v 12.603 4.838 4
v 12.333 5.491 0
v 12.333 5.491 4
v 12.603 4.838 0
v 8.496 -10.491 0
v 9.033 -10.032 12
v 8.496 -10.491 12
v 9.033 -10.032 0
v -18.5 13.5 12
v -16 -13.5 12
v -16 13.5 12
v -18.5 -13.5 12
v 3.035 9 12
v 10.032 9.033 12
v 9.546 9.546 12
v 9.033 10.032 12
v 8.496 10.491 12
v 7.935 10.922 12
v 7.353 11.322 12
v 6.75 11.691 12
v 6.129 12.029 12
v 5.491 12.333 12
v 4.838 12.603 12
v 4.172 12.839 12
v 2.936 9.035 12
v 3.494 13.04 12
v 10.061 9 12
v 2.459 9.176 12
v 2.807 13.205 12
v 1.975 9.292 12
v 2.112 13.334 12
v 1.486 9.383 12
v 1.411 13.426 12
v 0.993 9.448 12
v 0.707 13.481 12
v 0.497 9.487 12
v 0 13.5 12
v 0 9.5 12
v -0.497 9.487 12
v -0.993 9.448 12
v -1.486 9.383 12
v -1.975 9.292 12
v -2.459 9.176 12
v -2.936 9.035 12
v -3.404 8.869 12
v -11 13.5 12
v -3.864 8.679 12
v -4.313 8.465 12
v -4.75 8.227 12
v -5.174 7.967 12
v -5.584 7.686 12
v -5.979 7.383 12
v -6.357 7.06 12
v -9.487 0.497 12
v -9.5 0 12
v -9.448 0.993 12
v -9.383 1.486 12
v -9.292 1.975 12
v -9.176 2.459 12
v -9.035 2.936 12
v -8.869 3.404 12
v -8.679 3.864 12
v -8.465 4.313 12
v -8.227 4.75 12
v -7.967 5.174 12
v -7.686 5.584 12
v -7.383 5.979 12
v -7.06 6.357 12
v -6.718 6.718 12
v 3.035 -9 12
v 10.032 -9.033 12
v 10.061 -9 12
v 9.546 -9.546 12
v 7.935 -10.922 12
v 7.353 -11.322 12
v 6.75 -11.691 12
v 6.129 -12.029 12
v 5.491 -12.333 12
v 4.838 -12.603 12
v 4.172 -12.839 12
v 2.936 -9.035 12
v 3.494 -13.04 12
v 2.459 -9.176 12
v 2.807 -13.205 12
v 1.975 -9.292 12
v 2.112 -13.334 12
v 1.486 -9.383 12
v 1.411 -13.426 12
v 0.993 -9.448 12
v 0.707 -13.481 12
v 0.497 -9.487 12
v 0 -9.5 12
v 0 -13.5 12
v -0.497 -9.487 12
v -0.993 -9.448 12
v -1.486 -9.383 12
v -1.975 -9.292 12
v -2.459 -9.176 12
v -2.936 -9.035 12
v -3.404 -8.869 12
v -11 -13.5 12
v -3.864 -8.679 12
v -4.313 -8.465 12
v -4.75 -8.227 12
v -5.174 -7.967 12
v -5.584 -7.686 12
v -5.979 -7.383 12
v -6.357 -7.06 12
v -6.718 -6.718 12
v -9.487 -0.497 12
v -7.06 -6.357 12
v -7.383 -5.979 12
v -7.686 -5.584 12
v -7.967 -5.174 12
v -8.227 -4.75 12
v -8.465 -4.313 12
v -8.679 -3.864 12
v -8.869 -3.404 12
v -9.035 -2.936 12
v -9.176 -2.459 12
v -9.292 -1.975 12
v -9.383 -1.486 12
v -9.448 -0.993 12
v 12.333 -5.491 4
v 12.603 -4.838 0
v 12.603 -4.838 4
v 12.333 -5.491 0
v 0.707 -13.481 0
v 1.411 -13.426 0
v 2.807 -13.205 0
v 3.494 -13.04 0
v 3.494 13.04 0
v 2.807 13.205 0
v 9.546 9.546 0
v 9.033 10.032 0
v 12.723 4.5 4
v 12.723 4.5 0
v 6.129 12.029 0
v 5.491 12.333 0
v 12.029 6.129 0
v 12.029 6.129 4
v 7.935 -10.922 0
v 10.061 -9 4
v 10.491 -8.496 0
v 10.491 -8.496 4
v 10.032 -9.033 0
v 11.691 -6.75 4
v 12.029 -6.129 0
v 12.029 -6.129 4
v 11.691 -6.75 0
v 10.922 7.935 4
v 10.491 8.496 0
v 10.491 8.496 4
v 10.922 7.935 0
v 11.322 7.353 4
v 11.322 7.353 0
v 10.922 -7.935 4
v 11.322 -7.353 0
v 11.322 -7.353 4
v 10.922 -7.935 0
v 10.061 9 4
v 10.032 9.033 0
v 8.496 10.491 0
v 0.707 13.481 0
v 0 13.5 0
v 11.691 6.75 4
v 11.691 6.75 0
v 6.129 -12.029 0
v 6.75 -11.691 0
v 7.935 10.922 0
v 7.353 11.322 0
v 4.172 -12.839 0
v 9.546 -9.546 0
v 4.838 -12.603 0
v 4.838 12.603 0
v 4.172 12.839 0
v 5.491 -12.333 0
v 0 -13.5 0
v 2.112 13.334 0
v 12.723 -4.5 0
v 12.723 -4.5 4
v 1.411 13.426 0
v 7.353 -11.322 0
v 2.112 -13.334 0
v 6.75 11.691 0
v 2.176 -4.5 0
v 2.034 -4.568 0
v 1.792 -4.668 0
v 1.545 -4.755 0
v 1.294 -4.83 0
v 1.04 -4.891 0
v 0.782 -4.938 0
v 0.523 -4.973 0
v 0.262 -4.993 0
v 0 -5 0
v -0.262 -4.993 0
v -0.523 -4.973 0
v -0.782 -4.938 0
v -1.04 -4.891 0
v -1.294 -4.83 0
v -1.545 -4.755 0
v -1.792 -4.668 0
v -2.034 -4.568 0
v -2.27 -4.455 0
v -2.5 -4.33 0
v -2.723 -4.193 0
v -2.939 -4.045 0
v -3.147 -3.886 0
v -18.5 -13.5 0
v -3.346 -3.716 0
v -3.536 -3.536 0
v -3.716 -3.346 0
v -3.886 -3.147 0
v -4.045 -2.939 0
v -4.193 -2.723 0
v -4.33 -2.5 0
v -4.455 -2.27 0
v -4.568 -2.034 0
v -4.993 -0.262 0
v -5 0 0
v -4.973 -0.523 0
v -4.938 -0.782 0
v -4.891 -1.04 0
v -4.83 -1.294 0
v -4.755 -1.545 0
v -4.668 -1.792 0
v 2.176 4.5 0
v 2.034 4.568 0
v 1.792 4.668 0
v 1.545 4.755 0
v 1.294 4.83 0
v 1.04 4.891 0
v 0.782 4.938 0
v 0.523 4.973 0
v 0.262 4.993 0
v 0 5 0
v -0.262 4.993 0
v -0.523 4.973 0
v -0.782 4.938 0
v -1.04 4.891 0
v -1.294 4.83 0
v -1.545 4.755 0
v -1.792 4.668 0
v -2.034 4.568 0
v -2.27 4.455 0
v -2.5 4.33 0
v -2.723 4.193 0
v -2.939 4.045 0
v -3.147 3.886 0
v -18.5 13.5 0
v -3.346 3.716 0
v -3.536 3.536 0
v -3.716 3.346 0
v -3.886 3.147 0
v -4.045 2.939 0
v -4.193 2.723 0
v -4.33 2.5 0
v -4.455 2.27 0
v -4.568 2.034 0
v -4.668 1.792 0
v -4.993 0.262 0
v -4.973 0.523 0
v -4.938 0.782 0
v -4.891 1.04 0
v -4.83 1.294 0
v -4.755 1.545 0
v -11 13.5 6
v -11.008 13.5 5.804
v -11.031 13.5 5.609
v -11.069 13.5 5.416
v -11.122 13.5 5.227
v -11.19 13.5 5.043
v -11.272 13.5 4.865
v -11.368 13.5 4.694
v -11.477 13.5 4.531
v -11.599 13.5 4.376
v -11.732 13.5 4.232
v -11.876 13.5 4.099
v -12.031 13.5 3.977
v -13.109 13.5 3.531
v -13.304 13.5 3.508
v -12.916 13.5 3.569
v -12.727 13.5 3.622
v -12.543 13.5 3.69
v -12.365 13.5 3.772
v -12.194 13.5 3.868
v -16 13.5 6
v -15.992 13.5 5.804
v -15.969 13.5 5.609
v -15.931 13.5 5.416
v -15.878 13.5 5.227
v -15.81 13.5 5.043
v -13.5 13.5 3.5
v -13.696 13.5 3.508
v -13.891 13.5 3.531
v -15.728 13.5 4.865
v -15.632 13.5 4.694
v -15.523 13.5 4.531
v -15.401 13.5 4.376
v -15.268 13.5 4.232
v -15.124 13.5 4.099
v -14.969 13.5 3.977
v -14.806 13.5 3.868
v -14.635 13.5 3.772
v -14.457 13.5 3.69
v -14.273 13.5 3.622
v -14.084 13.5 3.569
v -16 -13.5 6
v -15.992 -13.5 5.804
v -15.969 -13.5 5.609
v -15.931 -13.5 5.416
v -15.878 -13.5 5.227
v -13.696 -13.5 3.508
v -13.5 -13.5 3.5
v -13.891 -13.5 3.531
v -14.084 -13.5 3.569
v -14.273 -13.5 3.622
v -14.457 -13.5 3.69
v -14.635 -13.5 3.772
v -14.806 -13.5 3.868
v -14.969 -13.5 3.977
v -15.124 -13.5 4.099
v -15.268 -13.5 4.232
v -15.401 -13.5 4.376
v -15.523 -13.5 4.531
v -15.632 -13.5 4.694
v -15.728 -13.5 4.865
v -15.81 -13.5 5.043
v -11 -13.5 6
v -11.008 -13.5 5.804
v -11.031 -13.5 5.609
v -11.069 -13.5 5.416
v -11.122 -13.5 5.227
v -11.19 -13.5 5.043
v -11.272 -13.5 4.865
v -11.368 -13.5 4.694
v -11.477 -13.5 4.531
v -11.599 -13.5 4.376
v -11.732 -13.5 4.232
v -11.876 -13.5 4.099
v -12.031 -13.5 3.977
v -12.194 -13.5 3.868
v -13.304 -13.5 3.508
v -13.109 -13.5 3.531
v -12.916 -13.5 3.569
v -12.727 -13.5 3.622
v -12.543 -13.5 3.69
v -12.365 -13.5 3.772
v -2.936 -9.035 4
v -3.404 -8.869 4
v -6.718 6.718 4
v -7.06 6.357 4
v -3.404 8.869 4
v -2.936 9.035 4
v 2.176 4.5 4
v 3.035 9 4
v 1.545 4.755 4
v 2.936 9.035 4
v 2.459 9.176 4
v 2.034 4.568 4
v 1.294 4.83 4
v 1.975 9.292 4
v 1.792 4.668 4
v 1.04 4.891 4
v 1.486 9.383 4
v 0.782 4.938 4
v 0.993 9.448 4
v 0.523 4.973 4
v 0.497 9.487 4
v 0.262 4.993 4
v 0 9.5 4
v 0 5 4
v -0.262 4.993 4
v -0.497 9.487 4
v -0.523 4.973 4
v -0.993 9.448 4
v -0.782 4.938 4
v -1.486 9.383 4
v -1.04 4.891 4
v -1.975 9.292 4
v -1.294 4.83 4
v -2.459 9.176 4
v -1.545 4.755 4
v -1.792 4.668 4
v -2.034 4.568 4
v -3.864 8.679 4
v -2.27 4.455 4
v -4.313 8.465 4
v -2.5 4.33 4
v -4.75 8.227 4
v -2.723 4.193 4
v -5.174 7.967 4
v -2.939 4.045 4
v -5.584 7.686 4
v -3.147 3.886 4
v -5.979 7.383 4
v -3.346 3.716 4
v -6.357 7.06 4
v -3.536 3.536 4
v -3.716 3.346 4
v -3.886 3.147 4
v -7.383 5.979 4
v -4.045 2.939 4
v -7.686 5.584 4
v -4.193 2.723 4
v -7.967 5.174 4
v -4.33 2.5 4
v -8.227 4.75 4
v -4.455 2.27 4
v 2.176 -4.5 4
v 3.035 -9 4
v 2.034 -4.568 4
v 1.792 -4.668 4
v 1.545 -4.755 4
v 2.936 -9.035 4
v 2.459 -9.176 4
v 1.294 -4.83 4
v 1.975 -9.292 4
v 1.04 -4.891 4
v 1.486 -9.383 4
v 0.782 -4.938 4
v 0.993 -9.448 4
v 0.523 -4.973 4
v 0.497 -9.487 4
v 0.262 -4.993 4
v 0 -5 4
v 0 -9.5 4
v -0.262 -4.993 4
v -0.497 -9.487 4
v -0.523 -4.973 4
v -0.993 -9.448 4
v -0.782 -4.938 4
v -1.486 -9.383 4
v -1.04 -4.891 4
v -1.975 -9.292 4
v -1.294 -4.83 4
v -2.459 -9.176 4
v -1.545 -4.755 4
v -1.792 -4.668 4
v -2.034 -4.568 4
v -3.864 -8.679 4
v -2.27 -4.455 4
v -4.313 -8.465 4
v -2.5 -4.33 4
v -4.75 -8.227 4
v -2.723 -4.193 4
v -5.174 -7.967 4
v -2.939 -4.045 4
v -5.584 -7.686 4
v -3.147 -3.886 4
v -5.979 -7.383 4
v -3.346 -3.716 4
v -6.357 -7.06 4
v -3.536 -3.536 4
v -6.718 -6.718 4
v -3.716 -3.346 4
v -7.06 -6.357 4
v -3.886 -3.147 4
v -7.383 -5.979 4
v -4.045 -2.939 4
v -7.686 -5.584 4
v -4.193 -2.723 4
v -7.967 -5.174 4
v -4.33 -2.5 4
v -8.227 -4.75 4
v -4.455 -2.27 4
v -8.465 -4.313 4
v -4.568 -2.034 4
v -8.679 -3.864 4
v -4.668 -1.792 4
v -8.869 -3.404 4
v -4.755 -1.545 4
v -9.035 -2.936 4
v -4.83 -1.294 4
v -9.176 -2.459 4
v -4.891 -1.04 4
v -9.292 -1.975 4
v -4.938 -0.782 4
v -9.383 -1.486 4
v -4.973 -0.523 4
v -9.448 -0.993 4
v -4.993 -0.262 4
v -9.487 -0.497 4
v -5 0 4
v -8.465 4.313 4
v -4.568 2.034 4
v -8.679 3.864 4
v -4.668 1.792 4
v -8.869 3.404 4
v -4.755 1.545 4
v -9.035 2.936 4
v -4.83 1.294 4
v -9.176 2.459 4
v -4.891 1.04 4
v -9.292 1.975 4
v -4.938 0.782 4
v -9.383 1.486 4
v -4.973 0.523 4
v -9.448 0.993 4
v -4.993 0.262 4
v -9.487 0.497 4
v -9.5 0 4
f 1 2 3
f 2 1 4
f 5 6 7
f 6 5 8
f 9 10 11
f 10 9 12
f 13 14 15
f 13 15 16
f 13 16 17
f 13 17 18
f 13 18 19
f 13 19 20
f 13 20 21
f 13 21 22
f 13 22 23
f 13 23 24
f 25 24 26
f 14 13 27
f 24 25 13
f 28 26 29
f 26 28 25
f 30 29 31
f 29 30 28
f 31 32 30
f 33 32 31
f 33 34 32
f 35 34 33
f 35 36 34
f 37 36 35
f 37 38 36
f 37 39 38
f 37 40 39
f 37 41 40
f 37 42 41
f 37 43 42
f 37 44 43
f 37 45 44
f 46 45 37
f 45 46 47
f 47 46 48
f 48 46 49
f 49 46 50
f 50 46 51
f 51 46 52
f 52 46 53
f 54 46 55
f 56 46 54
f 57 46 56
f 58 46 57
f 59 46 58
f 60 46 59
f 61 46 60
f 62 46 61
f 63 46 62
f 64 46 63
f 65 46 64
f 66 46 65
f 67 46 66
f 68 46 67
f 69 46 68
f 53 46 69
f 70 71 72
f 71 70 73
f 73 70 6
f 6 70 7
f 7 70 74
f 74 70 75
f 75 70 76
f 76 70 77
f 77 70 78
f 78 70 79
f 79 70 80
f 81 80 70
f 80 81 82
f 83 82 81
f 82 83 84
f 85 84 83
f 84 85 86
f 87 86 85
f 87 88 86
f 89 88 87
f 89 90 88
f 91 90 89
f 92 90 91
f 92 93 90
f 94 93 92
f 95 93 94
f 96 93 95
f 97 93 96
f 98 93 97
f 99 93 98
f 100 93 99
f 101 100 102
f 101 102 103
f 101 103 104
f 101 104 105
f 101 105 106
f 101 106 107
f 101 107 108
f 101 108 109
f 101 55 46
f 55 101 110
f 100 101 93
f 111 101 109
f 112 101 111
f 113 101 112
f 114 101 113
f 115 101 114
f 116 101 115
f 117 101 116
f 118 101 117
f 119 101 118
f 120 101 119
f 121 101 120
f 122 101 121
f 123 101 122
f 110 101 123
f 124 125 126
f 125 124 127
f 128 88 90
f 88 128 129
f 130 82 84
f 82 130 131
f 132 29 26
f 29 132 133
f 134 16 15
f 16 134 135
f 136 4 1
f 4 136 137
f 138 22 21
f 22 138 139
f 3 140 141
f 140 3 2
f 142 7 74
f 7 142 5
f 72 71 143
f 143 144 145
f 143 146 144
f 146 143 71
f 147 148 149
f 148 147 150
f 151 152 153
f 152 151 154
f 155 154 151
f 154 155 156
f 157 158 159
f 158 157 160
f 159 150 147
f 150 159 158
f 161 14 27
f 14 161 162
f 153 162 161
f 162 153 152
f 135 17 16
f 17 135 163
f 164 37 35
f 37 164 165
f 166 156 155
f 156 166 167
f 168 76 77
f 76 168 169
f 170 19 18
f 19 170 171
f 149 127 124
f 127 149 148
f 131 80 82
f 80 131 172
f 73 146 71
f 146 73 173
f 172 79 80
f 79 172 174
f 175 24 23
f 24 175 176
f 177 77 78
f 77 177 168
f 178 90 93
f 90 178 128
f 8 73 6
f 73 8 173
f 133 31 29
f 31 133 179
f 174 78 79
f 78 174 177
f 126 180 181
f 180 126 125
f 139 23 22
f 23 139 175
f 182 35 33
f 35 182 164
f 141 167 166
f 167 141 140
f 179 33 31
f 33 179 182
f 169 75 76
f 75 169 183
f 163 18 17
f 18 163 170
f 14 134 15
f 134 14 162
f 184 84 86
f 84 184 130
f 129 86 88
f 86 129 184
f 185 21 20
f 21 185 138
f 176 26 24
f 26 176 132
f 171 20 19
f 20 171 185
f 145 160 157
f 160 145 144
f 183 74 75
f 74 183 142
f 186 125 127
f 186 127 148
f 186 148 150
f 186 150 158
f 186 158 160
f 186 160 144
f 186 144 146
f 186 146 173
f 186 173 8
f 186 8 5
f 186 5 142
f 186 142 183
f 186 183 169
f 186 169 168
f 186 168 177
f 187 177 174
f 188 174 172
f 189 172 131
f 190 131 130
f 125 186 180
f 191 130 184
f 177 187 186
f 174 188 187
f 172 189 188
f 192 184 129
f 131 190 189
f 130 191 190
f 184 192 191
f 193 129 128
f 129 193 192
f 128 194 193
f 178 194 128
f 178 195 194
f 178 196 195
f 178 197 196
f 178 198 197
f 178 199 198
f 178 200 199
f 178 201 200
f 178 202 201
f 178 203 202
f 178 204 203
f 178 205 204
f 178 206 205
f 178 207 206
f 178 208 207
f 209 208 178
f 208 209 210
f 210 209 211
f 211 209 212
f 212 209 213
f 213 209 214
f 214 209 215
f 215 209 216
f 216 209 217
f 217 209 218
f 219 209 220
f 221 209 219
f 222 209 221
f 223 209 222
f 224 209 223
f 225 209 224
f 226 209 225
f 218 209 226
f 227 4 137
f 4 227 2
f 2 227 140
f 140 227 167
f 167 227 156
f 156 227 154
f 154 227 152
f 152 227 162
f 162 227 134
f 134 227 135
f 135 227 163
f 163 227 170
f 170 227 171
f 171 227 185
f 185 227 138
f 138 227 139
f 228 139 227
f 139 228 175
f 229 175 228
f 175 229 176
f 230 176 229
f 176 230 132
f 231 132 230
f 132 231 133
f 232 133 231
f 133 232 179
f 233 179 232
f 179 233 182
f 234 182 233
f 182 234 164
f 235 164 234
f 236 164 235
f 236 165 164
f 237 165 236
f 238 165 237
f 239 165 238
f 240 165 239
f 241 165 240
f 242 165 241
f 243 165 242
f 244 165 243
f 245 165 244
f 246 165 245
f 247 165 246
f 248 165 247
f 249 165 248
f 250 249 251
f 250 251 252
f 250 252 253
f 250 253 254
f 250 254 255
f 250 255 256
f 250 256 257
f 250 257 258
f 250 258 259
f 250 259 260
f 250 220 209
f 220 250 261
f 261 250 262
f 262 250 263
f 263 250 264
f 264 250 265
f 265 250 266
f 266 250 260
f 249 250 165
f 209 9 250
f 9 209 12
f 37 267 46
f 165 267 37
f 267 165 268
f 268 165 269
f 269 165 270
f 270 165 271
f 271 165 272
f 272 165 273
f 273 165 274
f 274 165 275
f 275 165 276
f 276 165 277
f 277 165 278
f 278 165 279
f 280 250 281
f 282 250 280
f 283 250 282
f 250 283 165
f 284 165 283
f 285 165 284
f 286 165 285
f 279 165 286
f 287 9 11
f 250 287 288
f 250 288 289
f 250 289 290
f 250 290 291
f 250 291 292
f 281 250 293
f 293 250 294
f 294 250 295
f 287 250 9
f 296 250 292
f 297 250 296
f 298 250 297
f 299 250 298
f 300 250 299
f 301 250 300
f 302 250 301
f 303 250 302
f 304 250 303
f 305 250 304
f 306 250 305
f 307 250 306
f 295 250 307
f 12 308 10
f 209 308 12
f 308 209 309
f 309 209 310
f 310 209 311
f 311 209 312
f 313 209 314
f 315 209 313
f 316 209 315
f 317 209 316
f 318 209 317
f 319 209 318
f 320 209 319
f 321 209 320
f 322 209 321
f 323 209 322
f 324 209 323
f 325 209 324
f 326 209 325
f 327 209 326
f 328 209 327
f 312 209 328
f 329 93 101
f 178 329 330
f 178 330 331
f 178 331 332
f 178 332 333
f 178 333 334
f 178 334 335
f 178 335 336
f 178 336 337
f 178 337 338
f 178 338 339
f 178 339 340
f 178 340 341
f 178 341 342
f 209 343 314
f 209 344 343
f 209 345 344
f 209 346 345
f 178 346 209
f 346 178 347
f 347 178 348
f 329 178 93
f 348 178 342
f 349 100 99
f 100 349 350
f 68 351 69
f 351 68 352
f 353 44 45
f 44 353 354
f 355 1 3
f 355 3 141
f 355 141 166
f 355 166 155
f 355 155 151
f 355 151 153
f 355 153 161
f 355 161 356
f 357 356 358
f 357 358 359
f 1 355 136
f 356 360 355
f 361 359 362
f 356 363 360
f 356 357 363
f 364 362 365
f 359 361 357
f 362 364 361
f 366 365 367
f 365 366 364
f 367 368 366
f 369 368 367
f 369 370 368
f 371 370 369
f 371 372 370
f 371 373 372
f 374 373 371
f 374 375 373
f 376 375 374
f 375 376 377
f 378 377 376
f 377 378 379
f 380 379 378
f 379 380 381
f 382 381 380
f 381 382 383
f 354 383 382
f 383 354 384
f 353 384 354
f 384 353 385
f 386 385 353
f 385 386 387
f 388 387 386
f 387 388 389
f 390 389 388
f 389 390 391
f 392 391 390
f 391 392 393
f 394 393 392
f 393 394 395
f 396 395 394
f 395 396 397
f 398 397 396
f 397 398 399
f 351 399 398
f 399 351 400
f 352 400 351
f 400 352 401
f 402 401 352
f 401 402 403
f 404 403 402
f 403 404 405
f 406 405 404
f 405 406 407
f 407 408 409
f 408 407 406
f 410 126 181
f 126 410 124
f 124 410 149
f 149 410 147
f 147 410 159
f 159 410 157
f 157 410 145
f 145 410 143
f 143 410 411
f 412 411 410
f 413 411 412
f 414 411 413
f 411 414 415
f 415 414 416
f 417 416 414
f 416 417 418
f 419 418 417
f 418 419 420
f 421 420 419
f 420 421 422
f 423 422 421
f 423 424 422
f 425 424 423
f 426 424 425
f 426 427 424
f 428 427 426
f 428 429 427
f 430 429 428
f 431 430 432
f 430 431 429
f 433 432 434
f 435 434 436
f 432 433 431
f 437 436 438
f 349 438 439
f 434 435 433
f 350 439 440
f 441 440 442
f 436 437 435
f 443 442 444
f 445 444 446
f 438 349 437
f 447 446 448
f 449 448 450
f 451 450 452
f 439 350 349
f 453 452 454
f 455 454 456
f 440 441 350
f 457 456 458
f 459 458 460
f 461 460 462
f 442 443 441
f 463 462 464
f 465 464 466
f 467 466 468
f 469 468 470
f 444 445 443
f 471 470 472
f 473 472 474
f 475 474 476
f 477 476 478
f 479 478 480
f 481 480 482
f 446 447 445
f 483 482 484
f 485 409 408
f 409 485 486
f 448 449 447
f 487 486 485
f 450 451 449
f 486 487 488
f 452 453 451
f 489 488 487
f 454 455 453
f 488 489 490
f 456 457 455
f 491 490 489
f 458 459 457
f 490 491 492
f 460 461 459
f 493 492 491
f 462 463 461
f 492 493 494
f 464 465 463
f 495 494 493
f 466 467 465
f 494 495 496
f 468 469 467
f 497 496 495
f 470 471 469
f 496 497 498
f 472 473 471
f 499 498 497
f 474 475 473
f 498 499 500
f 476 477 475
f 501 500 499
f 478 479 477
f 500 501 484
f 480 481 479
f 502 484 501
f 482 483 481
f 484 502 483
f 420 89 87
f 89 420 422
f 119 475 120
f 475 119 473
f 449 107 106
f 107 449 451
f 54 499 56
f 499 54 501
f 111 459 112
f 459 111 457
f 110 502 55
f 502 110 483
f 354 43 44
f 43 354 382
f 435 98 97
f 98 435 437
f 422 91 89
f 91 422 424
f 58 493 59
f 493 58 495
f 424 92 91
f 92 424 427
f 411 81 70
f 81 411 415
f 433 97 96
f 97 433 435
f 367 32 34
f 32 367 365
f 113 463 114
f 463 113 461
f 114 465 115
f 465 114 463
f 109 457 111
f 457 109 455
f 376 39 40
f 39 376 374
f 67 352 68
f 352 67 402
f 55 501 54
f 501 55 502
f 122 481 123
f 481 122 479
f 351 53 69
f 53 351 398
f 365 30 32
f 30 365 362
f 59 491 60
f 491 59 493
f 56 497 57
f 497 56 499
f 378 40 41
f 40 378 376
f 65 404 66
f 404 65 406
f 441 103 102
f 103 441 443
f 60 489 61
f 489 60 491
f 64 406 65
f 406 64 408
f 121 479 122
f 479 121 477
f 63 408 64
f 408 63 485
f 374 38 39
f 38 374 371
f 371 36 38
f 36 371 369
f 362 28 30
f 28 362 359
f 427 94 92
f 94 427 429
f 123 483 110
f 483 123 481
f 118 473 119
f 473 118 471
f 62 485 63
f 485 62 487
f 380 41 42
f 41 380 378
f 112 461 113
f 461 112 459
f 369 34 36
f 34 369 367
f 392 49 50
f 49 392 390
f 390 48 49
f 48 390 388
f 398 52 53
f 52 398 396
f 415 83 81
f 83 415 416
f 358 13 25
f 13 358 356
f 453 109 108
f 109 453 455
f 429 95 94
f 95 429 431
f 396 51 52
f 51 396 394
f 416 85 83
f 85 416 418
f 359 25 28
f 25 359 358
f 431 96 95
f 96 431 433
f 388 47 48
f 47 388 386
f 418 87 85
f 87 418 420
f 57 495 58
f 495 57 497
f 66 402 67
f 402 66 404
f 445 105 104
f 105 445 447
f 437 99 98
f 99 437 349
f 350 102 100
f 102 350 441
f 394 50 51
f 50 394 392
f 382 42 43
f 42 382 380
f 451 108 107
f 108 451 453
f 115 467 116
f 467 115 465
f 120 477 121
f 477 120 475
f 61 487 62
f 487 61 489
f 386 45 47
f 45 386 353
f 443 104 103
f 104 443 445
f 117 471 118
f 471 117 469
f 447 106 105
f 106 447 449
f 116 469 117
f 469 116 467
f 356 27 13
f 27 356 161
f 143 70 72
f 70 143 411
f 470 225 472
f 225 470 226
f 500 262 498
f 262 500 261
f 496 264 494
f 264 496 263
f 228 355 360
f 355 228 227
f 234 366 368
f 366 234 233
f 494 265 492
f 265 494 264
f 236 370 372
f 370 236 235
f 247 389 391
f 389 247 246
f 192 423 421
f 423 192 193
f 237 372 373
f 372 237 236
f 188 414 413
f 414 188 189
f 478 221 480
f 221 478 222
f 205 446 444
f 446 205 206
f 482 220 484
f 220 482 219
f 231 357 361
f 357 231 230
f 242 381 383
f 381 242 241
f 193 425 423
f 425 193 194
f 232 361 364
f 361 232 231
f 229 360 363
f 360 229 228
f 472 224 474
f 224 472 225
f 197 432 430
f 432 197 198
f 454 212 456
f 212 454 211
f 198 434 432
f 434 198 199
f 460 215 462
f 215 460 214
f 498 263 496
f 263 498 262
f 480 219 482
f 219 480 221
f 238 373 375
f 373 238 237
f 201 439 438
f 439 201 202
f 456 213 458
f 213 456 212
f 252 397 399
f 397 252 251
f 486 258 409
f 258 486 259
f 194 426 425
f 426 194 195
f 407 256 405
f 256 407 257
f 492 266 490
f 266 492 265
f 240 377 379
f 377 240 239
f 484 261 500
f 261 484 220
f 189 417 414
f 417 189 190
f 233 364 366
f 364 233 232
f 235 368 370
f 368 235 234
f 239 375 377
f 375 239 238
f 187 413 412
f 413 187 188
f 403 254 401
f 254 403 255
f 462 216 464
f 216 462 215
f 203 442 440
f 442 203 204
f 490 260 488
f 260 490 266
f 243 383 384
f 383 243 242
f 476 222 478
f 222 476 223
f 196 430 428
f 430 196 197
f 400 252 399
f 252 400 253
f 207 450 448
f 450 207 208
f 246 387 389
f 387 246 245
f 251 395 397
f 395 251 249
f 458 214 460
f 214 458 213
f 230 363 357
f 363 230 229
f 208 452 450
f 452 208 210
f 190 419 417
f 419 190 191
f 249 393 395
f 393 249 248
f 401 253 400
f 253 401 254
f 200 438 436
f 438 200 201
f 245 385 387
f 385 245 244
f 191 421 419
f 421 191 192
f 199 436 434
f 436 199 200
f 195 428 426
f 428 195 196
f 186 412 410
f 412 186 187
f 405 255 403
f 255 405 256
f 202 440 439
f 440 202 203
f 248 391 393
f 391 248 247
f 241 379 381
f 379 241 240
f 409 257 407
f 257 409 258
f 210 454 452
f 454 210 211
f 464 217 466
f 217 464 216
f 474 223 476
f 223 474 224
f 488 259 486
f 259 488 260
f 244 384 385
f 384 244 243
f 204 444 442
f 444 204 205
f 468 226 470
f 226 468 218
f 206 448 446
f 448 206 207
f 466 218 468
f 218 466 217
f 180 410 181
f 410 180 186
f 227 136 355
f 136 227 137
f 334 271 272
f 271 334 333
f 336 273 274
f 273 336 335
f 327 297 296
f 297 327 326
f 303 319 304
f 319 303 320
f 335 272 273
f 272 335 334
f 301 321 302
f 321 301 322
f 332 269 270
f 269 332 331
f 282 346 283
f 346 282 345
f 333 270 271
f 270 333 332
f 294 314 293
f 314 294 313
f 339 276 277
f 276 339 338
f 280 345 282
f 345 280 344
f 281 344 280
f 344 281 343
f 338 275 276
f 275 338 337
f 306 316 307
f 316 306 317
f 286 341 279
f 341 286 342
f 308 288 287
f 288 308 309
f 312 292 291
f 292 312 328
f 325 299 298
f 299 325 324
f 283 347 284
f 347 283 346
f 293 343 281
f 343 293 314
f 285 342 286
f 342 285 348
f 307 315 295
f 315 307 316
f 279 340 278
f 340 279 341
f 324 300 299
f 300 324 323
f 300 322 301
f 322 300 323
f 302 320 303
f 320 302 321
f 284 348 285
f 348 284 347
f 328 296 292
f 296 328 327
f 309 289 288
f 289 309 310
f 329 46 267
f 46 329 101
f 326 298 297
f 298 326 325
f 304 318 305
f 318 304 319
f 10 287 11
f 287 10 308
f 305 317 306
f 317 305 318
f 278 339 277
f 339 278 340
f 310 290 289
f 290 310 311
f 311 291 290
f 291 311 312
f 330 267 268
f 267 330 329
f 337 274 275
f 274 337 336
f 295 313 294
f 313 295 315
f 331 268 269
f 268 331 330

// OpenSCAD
large_dia = 19;
large_h = 8;
small_dia = 10;
small_h = 4;
wall = 4;
wire_dia = 5;

module under_cable_clip() {
  difference() {
    union() {
      cylinder(r=(large_dia/2)+wall, h=(large_h+small_h), $fn=120);
      translate([-large_dia/2-wall-5, -large_dia/2-wall, 0])
      cube([large_dia/2+wall+5, large_dia+wall*2, large_h+small_h]);
    }
    union() {
      translate([0, 0, small_h]) {
        cylinder(r=(large_dia/2), h=large_h+1, $fn=120);
        hull()
          for(x=[0, large_dia])
          translate([x, 0, 0])
          cylinder(r=(large_dia/2)-0.5, h=large_h+1, $fn=120);
      }
      translate([0, 0, -1]) {
        cylinder(r=(small_dia/2), h=small_h+2, $fn=120);
        hull()
          for(x=[0, large_dia])
          translate([x, 0, 0])
          cylinder(r=(small_dia/2)-0.5, h=small_h+2, $fn=120);
      }
      *translate([-large_dia/2-4-3, -large_dia/2-wall-1, 2])
        cube([6, large_dia+wall*2+2, 8]);
      *for(m=[0,1]) mirror([0, m, 0])
      translate([-large_dia/2-4-3, 0, -1])
        rotate([0, 0, -16]) cube([2, large_dia/2+wall+10, 8]);
      
      hull() for(z=[(large_h+small_h)/2, large_h+small_h])
      translate([-large_dia/2-wall, large_dia/2+wall+1, z])
        rotate([90, 0, 0]) 
        cylinder(r=wire_dia/2, h=large_dia+wall*2+2, $fn=80);
    }
  }
}

under_cable_clip();
